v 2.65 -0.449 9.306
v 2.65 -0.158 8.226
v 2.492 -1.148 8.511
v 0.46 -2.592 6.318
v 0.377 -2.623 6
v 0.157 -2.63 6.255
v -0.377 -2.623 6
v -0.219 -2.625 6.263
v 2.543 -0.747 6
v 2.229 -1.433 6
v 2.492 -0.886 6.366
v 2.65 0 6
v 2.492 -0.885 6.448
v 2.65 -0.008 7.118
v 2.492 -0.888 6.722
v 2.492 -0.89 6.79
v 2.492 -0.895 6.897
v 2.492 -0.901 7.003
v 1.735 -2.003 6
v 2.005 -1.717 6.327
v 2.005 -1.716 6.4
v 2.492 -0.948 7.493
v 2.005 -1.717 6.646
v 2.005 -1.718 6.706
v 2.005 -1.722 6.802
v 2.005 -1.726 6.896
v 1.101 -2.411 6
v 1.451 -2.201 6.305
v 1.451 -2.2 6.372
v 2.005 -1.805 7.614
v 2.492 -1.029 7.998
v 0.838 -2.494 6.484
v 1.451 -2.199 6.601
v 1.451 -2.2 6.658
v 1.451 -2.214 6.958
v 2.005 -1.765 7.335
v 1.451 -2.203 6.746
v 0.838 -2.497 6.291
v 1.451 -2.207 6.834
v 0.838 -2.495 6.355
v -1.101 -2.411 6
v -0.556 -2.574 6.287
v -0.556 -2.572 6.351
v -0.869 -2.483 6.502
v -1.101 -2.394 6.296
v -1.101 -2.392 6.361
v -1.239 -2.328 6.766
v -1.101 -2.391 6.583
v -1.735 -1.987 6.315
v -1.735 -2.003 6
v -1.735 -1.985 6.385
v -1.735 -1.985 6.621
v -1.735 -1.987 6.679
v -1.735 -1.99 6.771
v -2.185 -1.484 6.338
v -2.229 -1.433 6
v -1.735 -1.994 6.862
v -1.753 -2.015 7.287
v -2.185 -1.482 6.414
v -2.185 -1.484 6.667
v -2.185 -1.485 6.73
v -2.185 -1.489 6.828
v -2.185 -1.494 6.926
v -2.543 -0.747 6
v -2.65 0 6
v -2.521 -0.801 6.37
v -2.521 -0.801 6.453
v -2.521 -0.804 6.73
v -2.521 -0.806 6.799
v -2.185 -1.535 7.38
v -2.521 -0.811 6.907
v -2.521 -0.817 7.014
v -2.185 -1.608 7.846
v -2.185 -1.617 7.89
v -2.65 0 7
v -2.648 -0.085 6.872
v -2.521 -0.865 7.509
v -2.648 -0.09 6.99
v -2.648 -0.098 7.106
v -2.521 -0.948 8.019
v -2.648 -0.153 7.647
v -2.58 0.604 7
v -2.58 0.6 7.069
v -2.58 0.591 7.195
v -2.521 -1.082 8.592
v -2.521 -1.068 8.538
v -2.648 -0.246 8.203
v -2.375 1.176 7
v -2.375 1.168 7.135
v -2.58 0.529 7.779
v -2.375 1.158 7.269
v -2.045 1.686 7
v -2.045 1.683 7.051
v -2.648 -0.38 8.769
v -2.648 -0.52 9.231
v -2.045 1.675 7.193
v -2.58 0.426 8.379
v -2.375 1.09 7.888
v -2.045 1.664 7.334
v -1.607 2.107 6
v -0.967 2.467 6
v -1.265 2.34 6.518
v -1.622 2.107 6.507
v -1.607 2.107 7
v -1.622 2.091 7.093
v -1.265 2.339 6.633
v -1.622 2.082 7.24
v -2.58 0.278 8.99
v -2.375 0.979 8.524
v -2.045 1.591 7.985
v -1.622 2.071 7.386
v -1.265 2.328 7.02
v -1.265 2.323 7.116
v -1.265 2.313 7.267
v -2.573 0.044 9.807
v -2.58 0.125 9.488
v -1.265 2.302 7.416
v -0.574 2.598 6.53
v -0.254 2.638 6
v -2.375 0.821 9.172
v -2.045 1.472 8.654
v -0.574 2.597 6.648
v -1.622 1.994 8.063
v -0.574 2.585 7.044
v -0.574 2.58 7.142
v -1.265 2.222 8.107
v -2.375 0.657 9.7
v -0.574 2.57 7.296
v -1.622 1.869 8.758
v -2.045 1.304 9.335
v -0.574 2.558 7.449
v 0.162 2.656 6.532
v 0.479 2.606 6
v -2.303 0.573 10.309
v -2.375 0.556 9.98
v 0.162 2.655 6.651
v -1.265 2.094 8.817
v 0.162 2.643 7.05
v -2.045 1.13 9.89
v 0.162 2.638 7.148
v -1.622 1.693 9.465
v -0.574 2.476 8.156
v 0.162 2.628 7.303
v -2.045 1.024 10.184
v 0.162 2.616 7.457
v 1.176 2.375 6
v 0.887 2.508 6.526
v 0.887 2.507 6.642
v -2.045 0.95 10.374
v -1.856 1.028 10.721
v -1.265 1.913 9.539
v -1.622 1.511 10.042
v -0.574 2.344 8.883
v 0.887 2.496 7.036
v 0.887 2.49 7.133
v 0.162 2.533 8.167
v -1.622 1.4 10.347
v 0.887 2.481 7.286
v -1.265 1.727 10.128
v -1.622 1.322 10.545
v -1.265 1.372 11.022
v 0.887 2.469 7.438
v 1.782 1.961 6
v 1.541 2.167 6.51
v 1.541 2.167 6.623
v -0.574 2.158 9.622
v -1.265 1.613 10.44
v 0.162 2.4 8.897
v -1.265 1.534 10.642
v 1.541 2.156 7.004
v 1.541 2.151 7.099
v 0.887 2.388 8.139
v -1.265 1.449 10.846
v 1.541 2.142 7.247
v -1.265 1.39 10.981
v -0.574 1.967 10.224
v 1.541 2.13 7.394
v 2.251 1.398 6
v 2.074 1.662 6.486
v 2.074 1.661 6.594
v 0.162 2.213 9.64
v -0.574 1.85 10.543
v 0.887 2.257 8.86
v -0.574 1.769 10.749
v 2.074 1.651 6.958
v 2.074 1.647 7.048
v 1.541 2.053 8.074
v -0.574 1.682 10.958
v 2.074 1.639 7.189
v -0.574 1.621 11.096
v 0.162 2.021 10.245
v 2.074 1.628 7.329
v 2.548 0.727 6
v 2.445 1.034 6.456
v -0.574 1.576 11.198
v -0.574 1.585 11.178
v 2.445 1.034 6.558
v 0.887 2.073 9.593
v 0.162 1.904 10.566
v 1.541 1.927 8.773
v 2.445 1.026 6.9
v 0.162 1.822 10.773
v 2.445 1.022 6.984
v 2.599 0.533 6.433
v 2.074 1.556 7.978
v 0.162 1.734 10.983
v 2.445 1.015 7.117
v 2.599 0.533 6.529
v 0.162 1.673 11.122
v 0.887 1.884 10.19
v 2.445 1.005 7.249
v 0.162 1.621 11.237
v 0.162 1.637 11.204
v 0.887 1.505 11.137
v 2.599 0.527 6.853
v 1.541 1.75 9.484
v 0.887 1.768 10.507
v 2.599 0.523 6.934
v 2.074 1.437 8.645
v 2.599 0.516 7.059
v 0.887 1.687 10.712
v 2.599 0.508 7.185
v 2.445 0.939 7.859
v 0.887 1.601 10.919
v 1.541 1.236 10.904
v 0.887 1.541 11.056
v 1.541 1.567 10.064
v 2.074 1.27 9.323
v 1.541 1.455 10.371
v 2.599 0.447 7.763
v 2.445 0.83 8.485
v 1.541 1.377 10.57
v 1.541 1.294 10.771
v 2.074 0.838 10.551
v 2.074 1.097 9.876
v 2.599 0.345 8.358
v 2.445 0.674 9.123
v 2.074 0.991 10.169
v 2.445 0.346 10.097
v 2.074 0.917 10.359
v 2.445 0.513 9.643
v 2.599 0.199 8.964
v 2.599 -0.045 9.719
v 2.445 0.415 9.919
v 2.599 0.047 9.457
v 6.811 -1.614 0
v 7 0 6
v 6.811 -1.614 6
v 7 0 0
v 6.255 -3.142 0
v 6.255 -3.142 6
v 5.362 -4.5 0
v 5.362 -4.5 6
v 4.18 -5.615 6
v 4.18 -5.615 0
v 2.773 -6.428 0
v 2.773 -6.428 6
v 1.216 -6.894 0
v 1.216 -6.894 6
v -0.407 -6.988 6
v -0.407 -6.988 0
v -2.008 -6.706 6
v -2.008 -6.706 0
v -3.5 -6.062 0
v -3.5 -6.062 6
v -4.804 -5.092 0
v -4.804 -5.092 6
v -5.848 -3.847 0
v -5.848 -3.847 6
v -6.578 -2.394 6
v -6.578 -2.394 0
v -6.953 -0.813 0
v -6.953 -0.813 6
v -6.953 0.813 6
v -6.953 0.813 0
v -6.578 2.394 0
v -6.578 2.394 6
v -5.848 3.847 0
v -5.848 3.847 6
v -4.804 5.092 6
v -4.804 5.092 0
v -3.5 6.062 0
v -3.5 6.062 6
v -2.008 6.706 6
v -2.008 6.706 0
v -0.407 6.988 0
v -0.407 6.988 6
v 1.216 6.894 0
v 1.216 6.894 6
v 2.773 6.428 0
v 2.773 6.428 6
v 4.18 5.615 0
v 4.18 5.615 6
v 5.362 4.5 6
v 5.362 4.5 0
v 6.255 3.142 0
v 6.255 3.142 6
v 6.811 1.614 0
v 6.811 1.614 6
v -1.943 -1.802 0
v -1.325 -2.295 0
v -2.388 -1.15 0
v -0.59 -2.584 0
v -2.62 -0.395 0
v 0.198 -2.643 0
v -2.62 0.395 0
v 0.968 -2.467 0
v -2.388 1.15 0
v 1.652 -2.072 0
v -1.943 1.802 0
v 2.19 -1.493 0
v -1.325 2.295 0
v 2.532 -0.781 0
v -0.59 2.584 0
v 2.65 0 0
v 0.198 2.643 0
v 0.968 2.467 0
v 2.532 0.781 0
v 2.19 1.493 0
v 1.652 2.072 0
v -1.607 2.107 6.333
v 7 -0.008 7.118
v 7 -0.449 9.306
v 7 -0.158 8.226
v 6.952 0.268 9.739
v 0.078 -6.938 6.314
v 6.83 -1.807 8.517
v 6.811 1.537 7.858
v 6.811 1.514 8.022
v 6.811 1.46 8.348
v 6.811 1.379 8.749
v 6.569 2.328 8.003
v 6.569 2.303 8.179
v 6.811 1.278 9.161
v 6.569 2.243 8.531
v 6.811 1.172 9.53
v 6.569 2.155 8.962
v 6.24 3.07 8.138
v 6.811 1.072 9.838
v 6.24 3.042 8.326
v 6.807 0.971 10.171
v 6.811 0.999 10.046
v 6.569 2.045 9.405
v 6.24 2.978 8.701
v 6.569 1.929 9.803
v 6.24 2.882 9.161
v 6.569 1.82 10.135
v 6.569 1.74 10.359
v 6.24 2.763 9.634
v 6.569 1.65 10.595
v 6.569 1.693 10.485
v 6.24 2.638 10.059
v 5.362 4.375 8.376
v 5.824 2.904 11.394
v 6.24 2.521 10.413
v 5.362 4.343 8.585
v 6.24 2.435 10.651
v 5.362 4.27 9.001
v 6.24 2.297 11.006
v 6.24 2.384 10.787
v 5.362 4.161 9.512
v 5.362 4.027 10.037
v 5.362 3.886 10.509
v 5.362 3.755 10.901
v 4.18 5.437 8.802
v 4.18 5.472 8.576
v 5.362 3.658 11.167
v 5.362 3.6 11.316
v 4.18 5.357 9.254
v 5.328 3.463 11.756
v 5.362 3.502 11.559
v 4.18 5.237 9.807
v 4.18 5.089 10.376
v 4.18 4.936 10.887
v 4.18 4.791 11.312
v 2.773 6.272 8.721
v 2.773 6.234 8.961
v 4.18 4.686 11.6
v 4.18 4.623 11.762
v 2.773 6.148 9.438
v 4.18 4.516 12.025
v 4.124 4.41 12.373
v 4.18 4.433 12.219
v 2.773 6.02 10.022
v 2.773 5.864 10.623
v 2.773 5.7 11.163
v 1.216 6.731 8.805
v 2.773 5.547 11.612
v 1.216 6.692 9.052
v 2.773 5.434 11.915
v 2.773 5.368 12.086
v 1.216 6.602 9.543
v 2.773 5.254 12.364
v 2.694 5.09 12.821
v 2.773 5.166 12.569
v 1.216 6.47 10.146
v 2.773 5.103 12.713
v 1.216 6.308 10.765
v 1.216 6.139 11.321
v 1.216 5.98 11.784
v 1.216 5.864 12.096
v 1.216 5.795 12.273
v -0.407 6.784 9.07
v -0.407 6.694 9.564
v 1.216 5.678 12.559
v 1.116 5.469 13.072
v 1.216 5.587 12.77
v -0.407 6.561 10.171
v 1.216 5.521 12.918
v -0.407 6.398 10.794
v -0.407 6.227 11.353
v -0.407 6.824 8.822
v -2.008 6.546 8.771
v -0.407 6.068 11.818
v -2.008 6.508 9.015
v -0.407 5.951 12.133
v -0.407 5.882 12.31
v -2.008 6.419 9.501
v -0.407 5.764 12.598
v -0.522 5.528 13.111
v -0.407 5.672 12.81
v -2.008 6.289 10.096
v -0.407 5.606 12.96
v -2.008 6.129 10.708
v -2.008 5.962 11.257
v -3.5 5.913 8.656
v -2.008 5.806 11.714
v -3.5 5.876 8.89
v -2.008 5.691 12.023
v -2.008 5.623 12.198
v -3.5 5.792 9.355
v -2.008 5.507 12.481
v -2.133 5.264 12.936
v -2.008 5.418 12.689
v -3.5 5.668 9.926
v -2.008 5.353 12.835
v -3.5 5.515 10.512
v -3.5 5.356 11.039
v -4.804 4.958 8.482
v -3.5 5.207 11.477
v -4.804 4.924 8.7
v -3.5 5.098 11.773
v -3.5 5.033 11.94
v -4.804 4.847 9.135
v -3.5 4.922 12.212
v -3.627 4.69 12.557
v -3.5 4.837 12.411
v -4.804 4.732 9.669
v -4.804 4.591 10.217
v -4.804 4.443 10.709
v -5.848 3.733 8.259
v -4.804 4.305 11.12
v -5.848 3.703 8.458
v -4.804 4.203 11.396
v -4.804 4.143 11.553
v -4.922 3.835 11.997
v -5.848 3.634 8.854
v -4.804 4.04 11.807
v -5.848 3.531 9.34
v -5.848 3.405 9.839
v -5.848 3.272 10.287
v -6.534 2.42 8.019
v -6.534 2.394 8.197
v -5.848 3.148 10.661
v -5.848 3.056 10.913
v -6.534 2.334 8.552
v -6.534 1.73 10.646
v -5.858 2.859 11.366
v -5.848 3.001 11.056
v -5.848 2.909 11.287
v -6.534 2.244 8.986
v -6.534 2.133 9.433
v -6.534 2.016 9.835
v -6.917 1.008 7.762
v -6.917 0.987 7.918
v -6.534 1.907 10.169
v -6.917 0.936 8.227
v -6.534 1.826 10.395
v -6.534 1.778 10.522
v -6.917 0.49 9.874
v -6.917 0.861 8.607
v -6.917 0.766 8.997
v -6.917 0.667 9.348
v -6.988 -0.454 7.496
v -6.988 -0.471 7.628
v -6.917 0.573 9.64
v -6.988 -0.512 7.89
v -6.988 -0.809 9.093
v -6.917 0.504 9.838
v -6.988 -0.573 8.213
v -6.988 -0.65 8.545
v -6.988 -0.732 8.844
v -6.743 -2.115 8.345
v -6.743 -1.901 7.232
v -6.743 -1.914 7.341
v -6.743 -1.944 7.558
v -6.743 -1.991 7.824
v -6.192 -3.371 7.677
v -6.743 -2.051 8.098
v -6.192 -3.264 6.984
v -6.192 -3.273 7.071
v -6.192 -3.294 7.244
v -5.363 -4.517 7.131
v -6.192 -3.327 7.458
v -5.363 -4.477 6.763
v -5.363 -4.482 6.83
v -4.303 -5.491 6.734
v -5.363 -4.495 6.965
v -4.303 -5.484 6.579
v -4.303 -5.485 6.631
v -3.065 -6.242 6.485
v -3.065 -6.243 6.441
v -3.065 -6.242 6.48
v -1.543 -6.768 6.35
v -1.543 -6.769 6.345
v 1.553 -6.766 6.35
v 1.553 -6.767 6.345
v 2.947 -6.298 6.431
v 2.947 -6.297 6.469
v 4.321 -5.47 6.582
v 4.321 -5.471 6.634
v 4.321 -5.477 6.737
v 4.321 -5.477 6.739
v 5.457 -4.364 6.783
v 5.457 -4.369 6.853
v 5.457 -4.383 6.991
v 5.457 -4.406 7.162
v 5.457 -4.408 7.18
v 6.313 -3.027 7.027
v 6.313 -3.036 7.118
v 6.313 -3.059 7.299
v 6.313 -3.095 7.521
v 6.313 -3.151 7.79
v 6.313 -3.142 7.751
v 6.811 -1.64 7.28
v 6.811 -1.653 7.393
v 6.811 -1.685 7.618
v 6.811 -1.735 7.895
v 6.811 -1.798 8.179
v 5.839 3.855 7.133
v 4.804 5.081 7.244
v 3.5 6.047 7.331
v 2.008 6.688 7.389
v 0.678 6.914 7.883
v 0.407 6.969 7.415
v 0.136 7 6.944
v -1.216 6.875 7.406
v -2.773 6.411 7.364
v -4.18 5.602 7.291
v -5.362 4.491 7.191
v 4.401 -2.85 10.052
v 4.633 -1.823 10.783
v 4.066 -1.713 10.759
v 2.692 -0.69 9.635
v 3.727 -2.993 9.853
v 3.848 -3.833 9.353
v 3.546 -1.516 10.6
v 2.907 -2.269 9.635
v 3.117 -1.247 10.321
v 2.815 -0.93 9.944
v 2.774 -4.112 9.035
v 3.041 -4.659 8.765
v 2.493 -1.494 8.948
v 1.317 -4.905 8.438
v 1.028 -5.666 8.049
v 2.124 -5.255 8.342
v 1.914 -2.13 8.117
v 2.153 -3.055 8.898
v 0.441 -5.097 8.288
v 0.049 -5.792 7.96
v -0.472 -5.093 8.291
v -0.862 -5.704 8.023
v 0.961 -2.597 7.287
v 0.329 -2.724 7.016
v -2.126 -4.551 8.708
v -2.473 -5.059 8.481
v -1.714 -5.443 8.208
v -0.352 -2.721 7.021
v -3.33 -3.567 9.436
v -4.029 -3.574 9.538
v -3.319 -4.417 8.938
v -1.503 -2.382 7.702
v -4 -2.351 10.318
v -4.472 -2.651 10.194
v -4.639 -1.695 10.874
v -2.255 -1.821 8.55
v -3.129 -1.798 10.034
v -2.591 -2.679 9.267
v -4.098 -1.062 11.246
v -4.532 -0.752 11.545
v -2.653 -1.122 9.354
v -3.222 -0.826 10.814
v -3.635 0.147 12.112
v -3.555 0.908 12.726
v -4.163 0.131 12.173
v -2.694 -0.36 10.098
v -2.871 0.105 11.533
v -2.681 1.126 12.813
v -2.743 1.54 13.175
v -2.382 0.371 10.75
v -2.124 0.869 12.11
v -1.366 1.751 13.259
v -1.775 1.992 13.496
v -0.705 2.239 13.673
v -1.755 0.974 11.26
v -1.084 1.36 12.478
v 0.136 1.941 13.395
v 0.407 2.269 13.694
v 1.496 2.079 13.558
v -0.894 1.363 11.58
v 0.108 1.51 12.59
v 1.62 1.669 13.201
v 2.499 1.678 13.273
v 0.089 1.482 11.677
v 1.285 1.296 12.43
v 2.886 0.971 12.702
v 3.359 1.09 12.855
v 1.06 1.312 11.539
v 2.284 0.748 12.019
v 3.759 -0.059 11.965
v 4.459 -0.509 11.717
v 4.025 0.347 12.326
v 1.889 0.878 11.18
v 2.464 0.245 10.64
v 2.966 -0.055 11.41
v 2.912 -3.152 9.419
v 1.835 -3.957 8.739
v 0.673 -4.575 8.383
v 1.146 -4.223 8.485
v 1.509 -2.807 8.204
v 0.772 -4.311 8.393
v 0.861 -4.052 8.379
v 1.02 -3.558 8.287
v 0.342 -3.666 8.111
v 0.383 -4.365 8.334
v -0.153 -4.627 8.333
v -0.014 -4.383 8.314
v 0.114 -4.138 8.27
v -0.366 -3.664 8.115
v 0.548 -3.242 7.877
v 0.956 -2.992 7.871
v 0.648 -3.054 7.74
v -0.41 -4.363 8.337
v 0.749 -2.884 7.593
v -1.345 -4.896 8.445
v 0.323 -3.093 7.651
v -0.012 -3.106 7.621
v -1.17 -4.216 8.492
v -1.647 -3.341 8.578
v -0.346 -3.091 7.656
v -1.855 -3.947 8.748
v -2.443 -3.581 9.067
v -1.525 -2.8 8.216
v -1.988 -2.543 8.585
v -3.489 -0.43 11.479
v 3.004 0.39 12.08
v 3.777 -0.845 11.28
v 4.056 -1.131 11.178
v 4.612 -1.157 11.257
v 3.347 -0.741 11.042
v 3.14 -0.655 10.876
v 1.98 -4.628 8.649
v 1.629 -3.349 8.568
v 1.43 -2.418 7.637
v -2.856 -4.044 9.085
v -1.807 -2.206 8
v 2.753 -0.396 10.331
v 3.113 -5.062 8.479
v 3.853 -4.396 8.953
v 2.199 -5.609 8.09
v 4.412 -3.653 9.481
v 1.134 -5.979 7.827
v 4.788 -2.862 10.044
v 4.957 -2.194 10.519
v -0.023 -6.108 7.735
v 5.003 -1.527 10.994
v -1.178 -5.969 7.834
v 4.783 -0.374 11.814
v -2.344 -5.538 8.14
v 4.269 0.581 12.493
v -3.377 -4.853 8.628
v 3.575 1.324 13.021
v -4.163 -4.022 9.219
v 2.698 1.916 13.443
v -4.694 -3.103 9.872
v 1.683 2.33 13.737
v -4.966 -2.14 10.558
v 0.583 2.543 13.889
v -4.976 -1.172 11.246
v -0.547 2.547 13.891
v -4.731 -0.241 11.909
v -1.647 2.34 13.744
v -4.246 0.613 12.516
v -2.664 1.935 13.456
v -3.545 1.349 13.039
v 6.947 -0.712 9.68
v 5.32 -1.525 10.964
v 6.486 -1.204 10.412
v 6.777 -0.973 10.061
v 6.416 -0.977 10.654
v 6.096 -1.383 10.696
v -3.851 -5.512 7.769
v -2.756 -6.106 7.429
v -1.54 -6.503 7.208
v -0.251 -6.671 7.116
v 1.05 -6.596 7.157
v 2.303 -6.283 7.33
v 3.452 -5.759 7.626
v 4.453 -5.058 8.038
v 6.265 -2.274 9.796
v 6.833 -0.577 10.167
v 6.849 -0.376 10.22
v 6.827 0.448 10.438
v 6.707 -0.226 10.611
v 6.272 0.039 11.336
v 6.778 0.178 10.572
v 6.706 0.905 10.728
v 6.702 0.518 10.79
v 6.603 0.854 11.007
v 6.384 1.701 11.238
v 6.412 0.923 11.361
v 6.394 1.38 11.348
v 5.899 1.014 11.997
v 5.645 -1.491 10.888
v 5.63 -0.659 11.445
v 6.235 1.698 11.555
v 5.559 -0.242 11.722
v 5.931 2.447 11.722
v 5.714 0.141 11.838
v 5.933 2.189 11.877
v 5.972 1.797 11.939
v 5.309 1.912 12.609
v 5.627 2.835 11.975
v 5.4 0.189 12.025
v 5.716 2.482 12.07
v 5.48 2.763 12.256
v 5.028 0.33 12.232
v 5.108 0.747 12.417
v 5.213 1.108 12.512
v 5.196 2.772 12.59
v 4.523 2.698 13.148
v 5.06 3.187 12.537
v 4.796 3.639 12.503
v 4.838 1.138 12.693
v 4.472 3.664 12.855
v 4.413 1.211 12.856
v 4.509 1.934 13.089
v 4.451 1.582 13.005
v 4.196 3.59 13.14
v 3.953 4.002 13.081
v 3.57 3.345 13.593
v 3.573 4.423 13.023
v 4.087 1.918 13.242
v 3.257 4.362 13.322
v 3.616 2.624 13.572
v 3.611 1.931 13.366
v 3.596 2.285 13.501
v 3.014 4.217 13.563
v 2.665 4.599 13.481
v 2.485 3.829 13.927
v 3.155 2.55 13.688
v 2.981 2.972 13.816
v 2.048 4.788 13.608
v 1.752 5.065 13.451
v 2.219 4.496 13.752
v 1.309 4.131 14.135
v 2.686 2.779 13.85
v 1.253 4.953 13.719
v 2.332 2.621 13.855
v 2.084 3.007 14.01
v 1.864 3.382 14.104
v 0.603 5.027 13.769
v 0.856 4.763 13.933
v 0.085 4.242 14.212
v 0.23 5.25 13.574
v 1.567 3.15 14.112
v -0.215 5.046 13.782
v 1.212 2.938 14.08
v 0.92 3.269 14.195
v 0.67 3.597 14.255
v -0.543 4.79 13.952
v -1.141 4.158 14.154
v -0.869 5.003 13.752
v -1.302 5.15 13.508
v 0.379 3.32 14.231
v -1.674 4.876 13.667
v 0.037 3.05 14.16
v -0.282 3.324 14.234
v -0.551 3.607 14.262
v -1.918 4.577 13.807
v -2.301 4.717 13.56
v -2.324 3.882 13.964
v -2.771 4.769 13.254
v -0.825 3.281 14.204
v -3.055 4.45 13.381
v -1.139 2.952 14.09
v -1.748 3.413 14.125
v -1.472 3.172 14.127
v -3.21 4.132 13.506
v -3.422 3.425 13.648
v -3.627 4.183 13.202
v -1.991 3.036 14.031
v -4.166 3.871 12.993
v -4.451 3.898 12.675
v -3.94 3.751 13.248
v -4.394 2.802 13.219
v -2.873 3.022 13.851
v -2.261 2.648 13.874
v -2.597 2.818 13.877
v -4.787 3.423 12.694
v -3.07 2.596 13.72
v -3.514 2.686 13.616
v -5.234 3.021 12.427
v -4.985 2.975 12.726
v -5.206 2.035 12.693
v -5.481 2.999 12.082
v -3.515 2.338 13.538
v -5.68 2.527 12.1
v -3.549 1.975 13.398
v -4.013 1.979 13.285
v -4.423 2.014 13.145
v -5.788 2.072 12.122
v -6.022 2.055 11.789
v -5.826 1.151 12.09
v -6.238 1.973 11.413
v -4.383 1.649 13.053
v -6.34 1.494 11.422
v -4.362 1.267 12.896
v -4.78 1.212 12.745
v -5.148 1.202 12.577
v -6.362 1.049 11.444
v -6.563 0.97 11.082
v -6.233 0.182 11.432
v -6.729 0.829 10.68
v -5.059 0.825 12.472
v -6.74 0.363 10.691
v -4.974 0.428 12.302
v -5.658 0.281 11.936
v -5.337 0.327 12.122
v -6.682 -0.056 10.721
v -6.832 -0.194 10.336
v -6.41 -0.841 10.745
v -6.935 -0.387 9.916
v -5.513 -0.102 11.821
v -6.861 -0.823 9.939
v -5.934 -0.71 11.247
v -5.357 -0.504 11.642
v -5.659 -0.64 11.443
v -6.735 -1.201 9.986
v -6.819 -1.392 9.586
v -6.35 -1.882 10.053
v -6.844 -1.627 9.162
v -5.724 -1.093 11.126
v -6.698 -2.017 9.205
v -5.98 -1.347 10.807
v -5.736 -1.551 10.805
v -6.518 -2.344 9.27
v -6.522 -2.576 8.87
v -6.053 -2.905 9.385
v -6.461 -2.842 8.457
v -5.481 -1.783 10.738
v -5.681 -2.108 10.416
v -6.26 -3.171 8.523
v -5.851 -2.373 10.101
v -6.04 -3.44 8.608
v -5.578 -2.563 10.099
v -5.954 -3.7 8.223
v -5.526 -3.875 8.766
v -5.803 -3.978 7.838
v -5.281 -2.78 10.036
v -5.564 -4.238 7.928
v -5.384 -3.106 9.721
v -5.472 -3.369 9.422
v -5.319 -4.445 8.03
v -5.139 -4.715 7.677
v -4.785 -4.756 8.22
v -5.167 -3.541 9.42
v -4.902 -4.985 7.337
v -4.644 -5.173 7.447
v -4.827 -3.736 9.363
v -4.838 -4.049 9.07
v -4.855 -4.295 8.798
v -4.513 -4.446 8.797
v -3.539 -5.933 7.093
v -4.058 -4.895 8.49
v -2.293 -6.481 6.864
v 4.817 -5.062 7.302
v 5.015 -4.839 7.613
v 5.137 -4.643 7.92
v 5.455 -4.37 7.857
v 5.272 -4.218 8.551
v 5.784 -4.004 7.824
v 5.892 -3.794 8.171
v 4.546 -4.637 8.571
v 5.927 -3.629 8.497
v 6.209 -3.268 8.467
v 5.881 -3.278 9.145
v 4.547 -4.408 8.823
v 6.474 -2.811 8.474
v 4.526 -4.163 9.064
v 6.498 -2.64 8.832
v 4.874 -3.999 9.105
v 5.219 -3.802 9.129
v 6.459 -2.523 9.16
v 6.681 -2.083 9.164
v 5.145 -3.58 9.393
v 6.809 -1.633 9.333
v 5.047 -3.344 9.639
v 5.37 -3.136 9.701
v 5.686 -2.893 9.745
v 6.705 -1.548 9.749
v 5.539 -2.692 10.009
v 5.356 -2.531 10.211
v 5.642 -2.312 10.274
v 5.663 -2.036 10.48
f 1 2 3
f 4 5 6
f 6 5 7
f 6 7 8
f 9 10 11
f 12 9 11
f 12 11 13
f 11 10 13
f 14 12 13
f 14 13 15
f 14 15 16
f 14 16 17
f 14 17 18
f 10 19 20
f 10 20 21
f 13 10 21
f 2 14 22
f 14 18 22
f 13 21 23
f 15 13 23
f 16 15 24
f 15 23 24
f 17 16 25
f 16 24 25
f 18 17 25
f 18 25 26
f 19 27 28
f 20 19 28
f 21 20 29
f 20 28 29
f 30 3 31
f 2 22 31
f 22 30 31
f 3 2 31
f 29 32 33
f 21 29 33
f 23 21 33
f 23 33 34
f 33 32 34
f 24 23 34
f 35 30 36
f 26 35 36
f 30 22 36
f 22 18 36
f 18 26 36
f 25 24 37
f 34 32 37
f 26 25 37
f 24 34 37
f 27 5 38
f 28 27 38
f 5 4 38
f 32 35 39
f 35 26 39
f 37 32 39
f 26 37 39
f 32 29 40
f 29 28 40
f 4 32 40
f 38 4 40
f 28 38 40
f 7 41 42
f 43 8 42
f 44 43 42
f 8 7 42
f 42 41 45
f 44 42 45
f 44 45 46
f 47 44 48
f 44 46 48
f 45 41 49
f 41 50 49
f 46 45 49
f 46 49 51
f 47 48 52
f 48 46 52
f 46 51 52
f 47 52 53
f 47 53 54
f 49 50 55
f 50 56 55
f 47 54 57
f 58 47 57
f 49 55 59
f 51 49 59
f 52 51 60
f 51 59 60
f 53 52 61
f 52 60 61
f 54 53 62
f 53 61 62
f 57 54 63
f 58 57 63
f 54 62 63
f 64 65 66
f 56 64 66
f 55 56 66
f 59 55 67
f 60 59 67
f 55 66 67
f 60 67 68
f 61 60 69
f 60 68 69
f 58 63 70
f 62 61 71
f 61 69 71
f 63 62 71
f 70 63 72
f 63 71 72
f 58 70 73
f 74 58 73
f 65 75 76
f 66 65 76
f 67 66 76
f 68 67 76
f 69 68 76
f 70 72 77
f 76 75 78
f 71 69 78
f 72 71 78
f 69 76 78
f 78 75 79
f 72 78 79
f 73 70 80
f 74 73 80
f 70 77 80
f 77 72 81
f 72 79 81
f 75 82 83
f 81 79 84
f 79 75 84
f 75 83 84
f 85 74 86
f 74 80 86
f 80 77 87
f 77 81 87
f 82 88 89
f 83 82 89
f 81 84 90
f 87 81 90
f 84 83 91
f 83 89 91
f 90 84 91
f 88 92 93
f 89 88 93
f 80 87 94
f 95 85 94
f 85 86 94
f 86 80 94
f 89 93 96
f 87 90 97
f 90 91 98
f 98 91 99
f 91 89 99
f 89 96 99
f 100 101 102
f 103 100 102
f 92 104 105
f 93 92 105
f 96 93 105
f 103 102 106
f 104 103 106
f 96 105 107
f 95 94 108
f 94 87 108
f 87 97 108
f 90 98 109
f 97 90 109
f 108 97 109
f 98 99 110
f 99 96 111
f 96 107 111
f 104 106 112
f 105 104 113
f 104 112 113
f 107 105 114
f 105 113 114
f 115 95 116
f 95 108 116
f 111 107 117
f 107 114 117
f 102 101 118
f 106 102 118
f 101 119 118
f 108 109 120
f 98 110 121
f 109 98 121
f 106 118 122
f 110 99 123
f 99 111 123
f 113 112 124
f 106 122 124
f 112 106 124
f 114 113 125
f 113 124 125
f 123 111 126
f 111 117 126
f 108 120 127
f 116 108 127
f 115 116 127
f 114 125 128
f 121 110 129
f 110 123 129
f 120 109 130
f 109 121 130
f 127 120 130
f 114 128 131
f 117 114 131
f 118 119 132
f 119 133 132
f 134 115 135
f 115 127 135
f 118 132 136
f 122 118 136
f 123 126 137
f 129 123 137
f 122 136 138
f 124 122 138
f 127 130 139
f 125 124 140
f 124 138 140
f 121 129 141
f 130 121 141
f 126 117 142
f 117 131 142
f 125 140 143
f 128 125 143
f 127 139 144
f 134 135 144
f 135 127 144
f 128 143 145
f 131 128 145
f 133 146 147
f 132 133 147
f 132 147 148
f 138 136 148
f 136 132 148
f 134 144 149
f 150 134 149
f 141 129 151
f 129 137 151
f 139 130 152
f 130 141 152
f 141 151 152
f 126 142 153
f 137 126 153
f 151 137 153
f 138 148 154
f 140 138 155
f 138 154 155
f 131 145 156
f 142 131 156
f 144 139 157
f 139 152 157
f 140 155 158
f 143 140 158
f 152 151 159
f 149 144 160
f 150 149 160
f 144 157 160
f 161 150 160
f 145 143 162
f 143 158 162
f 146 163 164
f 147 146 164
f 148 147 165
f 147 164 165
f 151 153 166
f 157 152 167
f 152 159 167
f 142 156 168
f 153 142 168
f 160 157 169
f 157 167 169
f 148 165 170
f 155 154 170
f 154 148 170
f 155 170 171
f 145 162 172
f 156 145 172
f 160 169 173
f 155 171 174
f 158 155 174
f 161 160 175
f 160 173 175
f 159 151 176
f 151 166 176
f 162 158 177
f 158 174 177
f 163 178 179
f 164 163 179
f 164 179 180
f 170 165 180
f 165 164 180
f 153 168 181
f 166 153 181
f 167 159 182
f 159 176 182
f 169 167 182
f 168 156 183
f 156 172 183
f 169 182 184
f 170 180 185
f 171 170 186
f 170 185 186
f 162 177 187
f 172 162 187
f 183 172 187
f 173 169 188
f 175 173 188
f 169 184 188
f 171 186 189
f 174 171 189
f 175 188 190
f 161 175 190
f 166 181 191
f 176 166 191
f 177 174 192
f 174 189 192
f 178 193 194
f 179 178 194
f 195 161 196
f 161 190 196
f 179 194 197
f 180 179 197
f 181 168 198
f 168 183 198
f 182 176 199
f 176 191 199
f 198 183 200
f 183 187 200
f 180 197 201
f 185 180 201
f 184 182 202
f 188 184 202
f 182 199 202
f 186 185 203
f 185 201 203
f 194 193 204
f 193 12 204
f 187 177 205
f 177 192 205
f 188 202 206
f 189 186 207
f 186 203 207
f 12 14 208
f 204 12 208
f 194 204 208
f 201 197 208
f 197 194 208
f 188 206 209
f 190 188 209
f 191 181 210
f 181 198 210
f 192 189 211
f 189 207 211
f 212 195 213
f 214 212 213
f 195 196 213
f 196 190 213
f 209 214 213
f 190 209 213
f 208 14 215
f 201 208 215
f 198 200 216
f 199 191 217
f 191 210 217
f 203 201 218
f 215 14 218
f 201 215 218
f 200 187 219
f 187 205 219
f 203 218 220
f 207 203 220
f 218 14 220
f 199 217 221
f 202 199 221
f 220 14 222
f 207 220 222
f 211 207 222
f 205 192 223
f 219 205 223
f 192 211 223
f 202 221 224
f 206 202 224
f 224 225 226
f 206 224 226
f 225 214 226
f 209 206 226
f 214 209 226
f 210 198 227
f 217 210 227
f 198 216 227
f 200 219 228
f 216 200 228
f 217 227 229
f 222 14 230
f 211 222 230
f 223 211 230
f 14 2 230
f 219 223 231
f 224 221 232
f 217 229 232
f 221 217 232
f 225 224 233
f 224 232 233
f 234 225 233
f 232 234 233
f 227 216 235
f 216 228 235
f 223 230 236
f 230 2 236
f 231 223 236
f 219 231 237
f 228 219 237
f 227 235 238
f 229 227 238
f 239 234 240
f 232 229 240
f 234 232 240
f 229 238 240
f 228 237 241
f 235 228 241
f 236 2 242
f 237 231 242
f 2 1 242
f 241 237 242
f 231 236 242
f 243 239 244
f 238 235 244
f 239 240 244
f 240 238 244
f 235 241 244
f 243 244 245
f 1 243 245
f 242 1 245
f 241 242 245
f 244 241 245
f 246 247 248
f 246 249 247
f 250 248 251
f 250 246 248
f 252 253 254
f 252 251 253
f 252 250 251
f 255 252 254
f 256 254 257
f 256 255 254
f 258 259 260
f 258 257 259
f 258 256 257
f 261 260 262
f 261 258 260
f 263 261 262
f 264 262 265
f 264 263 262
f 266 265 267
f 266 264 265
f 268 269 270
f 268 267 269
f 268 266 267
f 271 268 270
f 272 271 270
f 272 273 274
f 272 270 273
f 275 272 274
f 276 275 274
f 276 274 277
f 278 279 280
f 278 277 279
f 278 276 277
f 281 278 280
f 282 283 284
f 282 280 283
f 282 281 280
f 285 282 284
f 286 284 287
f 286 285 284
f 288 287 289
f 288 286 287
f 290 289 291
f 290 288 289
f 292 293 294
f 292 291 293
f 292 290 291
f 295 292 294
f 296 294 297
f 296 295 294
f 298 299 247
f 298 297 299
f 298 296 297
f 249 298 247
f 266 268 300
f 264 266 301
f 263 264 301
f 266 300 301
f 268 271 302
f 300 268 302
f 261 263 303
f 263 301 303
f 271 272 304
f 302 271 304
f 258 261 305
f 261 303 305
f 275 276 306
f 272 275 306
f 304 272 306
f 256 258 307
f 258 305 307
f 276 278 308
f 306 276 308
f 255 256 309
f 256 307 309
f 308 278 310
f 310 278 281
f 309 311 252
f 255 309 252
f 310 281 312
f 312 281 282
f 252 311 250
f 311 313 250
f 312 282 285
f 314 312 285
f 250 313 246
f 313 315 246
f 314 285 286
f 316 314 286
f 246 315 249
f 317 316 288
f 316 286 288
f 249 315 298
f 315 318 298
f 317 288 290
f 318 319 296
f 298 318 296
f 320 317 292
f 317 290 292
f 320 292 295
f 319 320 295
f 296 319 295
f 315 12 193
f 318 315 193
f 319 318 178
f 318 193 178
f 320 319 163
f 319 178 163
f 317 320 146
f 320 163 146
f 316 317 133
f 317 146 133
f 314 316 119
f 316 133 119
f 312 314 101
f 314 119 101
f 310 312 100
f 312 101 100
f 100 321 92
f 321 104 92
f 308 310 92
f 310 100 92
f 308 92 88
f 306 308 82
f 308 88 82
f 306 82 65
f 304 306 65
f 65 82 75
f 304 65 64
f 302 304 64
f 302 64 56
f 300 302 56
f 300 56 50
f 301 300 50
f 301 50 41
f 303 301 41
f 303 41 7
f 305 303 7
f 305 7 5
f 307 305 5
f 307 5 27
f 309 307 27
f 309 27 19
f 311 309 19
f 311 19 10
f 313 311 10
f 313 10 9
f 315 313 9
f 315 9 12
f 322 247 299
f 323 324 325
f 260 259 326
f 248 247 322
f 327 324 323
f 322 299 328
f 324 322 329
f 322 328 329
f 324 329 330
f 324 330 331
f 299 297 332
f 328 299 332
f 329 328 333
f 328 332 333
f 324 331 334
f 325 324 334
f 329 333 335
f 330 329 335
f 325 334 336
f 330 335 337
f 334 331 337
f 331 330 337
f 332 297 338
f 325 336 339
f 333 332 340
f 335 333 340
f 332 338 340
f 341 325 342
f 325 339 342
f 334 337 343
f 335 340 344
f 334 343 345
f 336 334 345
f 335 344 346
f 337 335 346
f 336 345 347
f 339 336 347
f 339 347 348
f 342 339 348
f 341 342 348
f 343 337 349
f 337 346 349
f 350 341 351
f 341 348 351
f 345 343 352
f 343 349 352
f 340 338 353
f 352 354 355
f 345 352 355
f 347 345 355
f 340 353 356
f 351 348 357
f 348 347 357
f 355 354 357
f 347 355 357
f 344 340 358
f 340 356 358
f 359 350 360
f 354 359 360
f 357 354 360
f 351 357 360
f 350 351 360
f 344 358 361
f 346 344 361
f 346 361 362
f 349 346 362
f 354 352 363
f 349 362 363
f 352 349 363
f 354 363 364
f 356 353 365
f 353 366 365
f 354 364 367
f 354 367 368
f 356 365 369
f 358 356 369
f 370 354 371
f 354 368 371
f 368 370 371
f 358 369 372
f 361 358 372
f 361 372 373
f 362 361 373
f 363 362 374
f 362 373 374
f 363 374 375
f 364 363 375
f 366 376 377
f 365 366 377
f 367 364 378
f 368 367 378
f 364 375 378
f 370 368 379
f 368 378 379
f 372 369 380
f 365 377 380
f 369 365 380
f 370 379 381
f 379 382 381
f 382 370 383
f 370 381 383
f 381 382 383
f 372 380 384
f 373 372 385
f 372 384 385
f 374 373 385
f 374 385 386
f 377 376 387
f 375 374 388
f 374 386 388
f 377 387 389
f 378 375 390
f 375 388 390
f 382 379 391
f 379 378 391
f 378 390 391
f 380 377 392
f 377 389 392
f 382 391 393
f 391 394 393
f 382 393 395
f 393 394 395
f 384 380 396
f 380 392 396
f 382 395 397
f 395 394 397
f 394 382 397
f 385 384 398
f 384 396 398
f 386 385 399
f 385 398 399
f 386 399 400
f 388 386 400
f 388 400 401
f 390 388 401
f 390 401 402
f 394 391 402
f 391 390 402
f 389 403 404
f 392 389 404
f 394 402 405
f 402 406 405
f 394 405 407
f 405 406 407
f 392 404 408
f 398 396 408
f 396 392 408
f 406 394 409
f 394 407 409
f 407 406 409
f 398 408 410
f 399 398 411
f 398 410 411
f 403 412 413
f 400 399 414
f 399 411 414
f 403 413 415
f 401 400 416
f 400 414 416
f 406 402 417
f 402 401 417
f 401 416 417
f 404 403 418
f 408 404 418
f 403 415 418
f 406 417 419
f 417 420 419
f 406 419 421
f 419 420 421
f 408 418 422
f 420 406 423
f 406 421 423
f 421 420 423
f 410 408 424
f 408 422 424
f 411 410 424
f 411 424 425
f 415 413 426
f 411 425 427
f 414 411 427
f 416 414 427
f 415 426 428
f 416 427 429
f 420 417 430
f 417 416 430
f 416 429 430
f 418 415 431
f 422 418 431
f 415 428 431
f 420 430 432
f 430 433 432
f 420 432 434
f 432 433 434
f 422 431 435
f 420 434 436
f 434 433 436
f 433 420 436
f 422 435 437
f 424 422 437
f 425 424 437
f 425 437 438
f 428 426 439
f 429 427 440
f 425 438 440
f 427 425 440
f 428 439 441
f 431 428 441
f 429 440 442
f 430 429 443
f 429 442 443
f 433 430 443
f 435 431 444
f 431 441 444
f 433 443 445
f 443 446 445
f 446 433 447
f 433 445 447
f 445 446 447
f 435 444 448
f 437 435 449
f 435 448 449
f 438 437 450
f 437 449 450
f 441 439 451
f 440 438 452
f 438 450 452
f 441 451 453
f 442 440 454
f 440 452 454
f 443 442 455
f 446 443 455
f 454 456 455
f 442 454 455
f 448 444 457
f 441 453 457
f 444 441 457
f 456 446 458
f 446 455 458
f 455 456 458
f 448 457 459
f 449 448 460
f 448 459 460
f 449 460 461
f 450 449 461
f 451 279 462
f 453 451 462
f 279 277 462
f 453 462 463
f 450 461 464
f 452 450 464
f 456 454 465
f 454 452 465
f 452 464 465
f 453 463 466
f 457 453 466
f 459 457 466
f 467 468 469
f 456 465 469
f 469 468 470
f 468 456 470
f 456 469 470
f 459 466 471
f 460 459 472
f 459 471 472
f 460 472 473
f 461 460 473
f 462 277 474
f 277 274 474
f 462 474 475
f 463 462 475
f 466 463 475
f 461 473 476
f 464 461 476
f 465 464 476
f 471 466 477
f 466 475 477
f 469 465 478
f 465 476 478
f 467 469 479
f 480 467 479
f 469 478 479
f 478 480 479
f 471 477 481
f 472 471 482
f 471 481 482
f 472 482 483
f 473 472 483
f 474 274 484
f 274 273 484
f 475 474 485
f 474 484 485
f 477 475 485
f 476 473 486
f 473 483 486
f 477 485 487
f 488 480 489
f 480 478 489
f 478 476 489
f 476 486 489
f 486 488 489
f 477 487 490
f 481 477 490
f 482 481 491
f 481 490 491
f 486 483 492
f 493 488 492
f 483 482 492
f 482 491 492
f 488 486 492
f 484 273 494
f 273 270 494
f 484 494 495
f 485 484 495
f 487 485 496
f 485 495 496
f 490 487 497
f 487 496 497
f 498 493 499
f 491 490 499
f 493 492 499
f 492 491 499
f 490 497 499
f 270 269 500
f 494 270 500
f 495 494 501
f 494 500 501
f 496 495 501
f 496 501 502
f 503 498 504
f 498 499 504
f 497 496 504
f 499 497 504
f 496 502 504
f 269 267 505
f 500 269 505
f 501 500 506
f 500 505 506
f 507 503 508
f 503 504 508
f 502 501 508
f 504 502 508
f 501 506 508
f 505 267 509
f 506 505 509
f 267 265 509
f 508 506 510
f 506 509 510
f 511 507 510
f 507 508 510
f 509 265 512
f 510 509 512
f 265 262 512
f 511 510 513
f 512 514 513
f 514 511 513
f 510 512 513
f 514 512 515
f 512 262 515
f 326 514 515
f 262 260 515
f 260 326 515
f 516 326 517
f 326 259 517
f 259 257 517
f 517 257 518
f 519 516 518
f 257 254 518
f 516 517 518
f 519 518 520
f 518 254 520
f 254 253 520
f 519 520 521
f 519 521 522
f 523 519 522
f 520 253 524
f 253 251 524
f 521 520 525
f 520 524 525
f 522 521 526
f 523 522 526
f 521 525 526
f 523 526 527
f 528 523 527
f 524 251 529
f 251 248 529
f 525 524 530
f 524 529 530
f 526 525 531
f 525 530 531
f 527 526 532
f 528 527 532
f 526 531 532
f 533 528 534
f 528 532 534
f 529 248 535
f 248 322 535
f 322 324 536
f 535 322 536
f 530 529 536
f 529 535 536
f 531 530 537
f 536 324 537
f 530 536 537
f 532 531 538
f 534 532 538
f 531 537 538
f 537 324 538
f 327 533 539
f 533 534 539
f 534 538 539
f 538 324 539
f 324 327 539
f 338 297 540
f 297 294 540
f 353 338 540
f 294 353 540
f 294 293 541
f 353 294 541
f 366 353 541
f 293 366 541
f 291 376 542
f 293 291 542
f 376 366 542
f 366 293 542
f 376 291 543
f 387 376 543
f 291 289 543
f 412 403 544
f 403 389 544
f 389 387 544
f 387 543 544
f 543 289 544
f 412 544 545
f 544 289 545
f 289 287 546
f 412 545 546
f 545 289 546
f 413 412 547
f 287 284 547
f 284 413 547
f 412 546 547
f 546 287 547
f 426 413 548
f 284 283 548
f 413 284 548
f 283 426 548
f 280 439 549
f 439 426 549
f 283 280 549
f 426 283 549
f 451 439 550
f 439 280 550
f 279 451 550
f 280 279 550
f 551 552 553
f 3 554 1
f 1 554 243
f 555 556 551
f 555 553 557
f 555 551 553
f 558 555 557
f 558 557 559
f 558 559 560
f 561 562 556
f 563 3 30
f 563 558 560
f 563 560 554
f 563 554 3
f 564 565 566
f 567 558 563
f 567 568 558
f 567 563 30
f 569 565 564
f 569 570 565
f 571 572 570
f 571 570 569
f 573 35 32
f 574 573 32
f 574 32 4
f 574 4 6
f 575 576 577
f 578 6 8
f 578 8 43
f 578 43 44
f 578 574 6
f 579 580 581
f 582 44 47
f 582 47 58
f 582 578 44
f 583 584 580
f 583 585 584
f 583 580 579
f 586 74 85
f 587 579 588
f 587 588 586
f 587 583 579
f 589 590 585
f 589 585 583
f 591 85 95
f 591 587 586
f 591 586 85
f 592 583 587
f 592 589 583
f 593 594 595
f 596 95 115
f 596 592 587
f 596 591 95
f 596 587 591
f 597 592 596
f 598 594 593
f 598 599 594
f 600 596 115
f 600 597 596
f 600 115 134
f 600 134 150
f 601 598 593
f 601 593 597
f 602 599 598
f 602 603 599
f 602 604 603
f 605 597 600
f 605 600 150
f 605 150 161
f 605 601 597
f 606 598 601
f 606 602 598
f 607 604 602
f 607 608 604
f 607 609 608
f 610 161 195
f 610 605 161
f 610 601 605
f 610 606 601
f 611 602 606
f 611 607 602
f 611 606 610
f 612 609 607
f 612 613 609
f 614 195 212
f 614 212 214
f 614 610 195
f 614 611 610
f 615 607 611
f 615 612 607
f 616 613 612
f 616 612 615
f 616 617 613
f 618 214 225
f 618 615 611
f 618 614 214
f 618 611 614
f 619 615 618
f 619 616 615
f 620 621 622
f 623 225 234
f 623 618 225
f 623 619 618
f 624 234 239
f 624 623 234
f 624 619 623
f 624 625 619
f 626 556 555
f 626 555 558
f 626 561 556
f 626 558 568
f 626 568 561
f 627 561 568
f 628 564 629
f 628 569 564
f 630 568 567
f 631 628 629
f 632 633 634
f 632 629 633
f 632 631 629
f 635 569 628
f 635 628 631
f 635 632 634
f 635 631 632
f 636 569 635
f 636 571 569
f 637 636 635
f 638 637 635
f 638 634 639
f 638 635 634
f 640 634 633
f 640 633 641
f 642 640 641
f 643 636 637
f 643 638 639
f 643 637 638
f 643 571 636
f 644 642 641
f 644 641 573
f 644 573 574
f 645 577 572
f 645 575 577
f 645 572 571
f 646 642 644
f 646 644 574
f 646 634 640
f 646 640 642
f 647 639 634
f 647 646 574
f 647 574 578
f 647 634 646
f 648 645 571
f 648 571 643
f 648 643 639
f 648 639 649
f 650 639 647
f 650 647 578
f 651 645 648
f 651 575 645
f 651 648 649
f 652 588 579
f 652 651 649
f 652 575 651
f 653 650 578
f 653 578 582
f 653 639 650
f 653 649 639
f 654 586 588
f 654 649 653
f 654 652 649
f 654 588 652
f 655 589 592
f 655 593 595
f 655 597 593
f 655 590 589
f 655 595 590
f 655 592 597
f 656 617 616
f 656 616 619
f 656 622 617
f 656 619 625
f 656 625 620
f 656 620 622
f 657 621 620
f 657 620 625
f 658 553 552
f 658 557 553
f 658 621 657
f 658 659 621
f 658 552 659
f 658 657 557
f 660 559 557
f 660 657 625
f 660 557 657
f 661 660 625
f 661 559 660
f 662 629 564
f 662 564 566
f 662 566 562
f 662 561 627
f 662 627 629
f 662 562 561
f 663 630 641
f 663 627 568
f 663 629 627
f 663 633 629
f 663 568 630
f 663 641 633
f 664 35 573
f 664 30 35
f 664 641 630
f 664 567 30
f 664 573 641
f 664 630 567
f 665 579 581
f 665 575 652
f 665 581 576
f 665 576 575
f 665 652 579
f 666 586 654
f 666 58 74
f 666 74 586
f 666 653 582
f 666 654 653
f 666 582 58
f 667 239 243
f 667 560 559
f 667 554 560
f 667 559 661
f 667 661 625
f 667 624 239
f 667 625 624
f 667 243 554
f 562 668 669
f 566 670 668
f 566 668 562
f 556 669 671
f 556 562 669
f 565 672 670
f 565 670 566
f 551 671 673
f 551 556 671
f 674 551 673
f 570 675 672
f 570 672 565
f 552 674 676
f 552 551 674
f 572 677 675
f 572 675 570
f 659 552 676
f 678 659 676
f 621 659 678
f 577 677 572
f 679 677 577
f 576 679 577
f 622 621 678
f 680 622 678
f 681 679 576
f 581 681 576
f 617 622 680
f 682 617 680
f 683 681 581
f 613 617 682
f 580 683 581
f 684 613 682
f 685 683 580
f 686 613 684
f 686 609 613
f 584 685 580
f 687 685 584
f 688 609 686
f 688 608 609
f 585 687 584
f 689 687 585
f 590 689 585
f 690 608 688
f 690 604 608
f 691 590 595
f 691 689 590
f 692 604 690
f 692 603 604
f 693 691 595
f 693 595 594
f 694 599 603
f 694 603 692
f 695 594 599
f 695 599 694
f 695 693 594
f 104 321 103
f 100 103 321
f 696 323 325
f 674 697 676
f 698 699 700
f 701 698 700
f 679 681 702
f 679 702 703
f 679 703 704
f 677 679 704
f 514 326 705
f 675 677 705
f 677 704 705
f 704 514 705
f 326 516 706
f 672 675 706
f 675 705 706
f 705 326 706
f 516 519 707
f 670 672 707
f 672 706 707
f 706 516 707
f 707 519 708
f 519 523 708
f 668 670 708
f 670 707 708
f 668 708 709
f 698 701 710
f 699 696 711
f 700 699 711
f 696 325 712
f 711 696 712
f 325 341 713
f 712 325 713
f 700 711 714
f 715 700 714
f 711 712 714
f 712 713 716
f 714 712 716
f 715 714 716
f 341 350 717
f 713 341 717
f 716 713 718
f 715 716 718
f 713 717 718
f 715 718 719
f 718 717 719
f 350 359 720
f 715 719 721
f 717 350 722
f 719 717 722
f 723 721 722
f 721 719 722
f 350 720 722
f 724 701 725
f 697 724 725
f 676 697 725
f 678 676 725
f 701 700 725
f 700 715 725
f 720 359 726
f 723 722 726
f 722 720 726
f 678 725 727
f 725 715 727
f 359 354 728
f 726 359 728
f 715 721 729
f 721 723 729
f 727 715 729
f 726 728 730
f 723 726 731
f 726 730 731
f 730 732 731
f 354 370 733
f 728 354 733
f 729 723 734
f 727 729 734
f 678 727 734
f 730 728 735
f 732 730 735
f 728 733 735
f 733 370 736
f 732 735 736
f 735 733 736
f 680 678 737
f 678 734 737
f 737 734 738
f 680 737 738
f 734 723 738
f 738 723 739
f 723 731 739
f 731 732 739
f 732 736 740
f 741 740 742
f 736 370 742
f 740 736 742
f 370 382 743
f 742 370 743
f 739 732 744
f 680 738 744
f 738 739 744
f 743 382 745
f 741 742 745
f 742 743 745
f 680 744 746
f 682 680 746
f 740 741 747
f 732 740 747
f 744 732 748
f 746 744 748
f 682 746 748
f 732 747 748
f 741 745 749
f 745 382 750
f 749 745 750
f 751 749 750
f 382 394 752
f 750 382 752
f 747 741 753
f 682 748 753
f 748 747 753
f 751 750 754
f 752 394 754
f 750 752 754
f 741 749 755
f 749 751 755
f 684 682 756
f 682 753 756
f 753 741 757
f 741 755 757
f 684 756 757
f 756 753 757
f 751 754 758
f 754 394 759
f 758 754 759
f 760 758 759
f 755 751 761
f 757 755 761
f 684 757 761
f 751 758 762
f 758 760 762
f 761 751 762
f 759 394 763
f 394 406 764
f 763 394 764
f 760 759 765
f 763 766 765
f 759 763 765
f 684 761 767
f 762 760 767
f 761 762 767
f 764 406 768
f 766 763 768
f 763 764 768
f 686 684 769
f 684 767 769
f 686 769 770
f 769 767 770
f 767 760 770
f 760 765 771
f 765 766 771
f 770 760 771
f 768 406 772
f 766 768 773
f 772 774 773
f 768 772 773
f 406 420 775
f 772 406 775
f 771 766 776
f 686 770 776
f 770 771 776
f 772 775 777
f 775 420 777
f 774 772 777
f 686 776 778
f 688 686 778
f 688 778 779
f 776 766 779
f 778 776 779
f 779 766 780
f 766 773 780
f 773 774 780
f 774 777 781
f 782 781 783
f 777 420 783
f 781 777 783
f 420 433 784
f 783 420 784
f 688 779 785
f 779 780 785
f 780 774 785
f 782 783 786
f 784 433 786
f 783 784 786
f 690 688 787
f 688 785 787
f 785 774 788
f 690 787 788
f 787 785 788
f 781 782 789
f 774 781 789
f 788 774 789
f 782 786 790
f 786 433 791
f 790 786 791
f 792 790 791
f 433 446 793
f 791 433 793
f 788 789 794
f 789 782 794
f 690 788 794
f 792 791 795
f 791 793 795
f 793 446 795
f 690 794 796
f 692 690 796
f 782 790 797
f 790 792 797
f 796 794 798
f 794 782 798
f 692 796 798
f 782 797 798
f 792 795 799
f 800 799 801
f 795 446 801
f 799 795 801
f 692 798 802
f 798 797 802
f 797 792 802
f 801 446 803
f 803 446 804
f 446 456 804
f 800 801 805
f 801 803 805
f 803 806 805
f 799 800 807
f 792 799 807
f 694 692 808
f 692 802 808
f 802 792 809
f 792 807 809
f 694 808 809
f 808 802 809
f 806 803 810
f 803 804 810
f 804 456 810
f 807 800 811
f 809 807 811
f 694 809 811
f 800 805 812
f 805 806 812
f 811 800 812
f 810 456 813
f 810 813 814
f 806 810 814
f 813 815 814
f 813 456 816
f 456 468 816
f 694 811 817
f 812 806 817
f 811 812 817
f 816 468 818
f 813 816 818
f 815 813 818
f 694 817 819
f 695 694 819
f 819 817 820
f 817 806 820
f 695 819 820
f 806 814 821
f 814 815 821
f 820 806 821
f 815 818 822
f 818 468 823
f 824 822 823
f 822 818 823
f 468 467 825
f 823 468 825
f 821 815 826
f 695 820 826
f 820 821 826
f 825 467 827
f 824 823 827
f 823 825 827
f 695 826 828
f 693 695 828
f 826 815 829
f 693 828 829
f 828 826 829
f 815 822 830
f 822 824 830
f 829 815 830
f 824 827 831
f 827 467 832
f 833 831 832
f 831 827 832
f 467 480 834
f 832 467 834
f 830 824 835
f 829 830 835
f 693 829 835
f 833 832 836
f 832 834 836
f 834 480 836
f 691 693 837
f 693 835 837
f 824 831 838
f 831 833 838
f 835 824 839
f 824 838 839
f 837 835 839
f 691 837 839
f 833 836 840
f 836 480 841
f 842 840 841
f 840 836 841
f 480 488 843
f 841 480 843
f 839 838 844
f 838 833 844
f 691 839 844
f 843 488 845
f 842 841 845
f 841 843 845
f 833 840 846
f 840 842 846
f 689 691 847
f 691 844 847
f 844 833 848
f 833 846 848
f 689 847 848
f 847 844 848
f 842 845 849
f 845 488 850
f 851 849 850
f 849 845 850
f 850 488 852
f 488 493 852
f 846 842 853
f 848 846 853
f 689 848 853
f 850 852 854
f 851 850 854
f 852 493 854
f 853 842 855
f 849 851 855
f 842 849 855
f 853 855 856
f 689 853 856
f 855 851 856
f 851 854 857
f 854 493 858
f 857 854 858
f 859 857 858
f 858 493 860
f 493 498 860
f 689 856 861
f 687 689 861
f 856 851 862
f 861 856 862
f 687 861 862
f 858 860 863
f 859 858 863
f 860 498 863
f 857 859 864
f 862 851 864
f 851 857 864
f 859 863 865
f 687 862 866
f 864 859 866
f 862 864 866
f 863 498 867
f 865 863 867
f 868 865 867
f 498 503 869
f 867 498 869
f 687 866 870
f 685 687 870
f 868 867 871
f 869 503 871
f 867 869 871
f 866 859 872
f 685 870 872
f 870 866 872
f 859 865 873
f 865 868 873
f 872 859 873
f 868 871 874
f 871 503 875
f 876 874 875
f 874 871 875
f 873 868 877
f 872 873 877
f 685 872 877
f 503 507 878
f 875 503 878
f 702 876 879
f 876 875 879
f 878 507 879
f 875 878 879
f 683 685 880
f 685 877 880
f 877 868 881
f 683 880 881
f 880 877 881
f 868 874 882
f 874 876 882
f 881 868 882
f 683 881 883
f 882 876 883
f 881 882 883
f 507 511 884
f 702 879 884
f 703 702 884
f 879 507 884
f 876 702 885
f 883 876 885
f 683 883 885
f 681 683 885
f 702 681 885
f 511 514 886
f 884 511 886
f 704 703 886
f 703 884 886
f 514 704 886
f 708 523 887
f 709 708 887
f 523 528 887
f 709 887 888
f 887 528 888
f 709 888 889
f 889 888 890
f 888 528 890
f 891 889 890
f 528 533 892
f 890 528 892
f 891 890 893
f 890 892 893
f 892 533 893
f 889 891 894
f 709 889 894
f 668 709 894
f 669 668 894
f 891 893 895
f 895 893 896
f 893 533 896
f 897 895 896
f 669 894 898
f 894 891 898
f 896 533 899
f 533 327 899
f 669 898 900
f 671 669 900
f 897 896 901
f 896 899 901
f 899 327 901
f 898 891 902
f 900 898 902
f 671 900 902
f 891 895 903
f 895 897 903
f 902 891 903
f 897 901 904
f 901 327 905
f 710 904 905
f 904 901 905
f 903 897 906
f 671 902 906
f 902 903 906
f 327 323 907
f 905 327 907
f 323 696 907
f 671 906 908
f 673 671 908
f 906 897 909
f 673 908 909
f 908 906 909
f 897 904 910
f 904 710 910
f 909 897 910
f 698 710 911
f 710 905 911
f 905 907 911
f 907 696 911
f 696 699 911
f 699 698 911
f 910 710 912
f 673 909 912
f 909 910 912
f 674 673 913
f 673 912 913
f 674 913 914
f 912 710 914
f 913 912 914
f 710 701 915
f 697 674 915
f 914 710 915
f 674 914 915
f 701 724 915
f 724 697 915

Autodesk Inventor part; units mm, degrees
ref_plane "YZ Plane" through (0, 0, 0) normal (1, 0, 0) x (0, 1, 0)
ref_plane "XZ Plane" through (0, 0, 0) normal (0, 1, 0) x (-1, 0, 0)
ref_plane "XY Plane" through (0, 0, 0) normal (0, 0, 1) x (1, 0, 0)
sketch "Sketch1" plane through (0, 0, 0) normal (0, 0, 1) x (1, 0, 0)
  arc A0 (-4.9984, 0.1266) -> (-4.98, 0.4466) centre (0, 0) ccw projected
  circle A1 centre (0, 0) radius 7.5 projected
  circle A2 centre (0, 0) radius 7 projected
  circle A3 centre (0, 0) radius 7
  point P0 (0, 0)
extrude "Extrusion1" add sketch "Sketch1" along normal blind 6 contours A2
sketch "Sketch2" plane through (0, 0, 6) normal (0, 0, 1) x (1, 0, 0)
  line L0 (0, 0) -> (-2.839, 0)
  line L1 (-2.839, 0) -> (-2.839, 2.1073)
  line L2 (-2.839, 2.1073) -> (0, 2.1073)
  line L3 (0, 2.1073) -> (0, 0)
extrude "Extrusion2" add sketch "Sketch2" along normal blind 1
sketch "Sketch3" plane through (0, 0, 6) normal (1, 0, 0) x (0, 0, -1)
  line L0 (0, 7) -> (0, -7) projected
  line L1 (0, 2.1073) -> (0, 0) projected
  line L2 (0, 0) -> (-1, 0) projected
  arc A0 (0, 0) -> (-5.1393, -1.322) centre (-0.5, -8.7067) ccw
  point P0 (6, 0)
  point P1 (-3.7243, -0.9054)
  point P2 (-4.3276, -1.2024)
sketch "Sketch4" plane through (0, 0, 6) normal (0, 0, 1) x (1, 0, 0)
  circle A0 centre (0, 0) radius 7
  circle A1 centre (0, 0) radius 2.65
  dimension "d20" = 5.3
sketch "Sketch8" plane through (0, 0, 7) normal (0, 0, 1) x (1, 0, 0)
  circle A0 centre (0, 0) radius 2.65
  dimension "d17" = 5.3
extrude "Extrusion3" cut sketch "Sketch8" against normal blind 100
sweep "Sweep6" add profiles "Sketch4" path "Sketch3" path curves A0
fillet "Fillet2" radius 2 2 edges at (-2.65, -1.322, 11.1393) (-7, -1.322, 11.1393)
properties part number "Eyes"
